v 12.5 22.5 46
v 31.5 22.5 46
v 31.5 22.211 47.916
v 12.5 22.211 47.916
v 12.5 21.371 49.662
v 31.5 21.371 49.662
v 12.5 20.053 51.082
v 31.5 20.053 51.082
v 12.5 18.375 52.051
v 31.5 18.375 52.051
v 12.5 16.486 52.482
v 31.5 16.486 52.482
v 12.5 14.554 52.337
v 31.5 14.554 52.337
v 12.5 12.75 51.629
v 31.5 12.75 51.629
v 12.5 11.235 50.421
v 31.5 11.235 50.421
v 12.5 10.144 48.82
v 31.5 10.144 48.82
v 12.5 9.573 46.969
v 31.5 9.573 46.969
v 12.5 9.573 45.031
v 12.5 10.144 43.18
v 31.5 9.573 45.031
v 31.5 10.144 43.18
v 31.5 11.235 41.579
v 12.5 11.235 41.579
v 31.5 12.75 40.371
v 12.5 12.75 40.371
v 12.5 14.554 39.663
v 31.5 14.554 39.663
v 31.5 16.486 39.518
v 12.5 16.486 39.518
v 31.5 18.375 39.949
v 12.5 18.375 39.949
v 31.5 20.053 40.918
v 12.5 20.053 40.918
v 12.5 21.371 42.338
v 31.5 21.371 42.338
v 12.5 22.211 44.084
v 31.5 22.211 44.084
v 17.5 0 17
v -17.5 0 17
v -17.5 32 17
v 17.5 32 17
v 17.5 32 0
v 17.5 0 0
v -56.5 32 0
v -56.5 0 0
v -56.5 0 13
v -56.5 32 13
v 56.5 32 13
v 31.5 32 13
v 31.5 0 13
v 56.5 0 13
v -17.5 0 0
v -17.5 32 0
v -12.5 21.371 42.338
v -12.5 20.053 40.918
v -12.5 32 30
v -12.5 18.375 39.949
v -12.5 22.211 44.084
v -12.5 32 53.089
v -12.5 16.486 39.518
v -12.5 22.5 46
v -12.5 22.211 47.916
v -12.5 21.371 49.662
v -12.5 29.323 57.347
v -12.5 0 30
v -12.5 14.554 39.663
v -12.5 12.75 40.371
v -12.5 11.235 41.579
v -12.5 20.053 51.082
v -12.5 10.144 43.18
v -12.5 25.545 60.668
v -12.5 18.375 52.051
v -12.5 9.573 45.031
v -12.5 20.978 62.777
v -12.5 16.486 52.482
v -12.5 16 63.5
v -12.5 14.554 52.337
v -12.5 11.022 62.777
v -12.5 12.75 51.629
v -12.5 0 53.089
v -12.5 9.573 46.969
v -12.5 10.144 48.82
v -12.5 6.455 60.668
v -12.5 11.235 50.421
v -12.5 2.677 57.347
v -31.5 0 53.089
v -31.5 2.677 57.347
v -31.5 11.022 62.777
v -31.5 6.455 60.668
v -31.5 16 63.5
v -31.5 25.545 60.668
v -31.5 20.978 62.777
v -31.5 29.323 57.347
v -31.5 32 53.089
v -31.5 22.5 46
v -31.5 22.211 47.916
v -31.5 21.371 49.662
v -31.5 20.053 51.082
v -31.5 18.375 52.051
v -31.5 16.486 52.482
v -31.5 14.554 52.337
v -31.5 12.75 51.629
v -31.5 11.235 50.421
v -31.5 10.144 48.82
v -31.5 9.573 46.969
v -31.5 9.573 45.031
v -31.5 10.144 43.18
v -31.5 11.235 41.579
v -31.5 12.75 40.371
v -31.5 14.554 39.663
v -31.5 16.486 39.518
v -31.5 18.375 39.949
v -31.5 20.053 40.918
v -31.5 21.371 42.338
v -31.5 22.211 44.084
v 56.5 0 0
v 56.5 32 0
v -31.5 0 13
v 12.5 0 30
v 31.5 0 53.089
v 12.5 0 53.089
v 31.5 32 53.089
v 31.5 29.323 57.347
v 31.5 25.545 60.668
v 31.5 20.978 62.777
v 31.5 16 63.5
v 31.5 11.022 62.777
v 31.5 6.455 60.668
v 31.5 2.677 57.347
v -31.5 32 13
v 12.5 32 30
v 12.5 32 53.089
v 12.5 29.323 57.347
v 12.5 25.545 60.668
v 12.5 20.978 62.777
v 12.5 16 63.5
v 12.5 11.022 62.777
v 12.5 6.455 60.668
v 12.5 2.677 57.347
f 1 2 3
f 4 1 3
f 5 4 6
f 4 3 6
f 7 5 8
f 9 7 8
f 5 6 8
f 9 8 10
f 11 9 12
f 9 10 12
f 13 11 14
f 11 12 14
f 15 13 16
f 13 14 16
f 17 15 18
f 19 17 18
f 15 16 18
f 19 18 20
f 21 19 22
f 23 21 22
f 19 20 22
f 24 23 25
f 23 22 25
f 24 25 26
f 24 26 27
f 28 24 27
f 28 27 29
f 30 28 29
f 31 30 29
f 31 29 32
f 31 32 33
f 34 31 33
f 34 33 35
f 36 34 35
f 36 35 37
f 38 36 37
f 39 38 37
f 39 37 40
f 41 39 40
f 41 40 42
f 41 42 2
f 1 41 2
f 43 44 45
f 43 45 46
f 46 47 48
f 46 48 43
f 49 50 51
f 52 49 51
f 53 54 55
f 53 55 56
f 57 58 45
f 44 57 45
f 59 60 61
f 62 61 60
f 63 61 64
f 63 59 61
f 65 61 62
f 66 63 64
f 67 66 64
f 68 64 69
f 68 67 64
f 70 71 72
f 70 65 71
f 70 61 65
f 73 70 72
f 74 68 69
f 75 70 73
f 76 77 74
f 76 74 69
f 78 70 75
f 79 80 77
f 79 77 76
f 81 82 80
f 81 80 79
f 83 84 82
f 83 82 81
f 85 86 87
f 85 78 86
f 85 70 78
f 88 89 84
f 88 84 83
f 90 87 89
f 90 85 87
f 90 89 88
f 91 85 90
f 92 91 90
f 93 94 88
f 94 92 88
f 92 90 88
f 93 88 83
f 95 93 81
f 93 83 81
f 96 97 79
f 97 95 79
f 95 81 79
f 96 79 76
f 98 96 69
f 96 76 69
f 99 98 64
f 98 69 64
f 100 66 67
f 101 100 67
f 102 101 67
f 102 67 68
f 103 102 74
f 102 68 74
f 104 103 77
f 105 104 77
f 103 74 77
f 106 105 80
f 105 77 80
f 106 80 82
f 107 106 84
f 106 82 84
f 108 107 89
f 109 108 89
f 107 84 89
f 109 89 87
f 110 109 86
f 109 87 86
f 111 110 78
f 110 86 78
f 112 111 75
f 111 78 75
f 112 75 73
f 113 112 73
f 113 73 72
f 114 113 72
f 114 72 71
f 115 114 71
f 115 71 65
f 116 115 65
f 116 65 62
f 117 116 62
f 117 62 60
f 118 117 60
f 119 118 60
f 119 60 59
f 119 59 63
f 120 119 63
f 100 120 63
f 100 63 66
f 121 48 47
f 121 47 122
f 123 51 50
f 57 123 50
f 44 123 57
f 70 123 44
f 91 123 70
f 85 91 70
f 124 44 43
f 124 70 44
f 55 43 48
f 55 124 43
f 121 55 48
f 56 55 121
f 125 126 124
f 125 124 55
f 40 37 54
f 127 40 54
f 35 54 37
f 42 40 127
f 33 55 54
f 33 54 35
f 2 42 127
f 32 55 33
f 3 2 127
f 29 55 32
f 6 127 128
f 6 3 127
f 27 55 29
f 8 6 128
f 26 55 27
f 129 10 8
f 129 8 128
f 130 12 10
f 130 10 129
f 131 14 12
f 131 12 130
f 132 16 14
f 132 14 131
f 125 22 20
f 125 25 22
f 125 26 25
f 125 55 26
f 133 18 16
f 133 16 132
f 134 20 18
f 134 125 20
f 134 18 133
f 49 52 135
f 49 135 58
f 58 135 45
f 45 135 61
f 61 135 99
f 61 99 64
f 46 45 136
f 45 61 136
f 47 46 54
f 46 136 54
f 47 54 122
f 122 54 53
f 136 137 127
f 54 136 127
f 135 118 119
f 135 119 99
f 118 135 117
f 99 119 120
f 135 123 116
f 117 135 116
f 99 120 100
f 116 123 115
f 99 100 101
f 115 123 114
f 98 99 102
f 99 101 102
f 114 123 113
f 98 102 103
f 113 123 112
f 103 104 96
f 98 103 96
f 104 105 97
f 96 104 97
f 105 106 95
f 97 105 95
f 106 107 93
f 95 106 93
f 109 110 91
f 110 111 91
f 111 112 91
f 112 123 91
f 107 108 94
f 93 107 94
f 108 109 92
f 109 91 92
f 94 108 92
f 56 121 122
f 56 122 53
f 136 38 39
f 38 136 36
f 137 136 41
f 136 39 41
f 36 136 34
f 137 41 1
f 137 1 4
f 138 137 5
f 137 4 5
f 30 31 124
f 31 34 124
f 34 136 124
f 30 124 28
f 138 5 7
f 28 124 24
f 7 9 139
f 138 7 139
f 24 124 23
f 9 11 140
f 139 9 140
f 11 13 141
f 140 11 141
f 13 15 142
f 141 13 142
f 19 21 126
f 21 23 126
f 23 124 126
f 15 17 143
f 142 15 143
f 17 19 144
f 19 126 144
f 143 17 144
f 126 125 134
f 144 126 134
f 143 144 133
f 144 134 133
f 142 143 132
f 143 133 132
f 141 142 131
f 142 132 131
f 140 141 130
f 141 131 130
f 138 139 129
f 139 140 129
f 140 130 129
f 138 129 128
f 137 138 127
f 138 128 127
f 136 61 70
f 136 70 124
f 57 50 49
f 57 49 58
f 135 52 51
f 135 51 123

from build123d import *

# Parameters (mm, degrees)
F0_W     = 113
F0_H     = 64
F1_DEPTH = 32
F2_R     = 6.5
F3_DEPTH = 113.001
F4_W     = 35
F4_H     = 17
F4_W_2   = 25
F4_H_2   = 51
F4_H_3   = 34
F5_DEPTH = 32.001


with BuildPart() as f1:
    # F0 (on Front) → F1 (new body)
    with BuildSketch(Plane.XZ):
        with Locations((0, 32)):
            Rectangle(F0_W, F0_H)
    extrude(amount=-F1_DEPTH)

    # F2 (on face) → F3 (cut, through all)
    with BuildSketch(Plane.YZ.offset(56.5)):
        with Locations((16, 46)):
            Circle(F2_R)
        with BuildLine():
            Line((0, 64), (0, 53.088723))
            ThreePointArc((0, 53.088723), (16, 63.5), (32, 53.088723))
            Line((32, 53.088723), (32, 64))
            Line((32, 64), (0, 64))
        make_face()
    extrude(amount=-F3_DEPTH, mode=Mode.SUBTRACT)

    # F4 (on Front) → F5 (cut, through all)
    with BuildSketch(Plane.XZ):
        with Locations((0, 8.5)):
            Rectangle(F4_W, F4_H)
        with Locations((-44, 38.5)):
            Rectangle(F4_W_2, F4_H_2)
        with Locations((44, 38.5)):
            Rectangle(F4_W_2, F4_H_2)
        with Locations((0, 47)):
            Rectangle(F4_W_2, F4_H_3)
    extrude(amount=-F5_DEPTH, mode=Mode.SUBTRACT)


solid = f1.part
